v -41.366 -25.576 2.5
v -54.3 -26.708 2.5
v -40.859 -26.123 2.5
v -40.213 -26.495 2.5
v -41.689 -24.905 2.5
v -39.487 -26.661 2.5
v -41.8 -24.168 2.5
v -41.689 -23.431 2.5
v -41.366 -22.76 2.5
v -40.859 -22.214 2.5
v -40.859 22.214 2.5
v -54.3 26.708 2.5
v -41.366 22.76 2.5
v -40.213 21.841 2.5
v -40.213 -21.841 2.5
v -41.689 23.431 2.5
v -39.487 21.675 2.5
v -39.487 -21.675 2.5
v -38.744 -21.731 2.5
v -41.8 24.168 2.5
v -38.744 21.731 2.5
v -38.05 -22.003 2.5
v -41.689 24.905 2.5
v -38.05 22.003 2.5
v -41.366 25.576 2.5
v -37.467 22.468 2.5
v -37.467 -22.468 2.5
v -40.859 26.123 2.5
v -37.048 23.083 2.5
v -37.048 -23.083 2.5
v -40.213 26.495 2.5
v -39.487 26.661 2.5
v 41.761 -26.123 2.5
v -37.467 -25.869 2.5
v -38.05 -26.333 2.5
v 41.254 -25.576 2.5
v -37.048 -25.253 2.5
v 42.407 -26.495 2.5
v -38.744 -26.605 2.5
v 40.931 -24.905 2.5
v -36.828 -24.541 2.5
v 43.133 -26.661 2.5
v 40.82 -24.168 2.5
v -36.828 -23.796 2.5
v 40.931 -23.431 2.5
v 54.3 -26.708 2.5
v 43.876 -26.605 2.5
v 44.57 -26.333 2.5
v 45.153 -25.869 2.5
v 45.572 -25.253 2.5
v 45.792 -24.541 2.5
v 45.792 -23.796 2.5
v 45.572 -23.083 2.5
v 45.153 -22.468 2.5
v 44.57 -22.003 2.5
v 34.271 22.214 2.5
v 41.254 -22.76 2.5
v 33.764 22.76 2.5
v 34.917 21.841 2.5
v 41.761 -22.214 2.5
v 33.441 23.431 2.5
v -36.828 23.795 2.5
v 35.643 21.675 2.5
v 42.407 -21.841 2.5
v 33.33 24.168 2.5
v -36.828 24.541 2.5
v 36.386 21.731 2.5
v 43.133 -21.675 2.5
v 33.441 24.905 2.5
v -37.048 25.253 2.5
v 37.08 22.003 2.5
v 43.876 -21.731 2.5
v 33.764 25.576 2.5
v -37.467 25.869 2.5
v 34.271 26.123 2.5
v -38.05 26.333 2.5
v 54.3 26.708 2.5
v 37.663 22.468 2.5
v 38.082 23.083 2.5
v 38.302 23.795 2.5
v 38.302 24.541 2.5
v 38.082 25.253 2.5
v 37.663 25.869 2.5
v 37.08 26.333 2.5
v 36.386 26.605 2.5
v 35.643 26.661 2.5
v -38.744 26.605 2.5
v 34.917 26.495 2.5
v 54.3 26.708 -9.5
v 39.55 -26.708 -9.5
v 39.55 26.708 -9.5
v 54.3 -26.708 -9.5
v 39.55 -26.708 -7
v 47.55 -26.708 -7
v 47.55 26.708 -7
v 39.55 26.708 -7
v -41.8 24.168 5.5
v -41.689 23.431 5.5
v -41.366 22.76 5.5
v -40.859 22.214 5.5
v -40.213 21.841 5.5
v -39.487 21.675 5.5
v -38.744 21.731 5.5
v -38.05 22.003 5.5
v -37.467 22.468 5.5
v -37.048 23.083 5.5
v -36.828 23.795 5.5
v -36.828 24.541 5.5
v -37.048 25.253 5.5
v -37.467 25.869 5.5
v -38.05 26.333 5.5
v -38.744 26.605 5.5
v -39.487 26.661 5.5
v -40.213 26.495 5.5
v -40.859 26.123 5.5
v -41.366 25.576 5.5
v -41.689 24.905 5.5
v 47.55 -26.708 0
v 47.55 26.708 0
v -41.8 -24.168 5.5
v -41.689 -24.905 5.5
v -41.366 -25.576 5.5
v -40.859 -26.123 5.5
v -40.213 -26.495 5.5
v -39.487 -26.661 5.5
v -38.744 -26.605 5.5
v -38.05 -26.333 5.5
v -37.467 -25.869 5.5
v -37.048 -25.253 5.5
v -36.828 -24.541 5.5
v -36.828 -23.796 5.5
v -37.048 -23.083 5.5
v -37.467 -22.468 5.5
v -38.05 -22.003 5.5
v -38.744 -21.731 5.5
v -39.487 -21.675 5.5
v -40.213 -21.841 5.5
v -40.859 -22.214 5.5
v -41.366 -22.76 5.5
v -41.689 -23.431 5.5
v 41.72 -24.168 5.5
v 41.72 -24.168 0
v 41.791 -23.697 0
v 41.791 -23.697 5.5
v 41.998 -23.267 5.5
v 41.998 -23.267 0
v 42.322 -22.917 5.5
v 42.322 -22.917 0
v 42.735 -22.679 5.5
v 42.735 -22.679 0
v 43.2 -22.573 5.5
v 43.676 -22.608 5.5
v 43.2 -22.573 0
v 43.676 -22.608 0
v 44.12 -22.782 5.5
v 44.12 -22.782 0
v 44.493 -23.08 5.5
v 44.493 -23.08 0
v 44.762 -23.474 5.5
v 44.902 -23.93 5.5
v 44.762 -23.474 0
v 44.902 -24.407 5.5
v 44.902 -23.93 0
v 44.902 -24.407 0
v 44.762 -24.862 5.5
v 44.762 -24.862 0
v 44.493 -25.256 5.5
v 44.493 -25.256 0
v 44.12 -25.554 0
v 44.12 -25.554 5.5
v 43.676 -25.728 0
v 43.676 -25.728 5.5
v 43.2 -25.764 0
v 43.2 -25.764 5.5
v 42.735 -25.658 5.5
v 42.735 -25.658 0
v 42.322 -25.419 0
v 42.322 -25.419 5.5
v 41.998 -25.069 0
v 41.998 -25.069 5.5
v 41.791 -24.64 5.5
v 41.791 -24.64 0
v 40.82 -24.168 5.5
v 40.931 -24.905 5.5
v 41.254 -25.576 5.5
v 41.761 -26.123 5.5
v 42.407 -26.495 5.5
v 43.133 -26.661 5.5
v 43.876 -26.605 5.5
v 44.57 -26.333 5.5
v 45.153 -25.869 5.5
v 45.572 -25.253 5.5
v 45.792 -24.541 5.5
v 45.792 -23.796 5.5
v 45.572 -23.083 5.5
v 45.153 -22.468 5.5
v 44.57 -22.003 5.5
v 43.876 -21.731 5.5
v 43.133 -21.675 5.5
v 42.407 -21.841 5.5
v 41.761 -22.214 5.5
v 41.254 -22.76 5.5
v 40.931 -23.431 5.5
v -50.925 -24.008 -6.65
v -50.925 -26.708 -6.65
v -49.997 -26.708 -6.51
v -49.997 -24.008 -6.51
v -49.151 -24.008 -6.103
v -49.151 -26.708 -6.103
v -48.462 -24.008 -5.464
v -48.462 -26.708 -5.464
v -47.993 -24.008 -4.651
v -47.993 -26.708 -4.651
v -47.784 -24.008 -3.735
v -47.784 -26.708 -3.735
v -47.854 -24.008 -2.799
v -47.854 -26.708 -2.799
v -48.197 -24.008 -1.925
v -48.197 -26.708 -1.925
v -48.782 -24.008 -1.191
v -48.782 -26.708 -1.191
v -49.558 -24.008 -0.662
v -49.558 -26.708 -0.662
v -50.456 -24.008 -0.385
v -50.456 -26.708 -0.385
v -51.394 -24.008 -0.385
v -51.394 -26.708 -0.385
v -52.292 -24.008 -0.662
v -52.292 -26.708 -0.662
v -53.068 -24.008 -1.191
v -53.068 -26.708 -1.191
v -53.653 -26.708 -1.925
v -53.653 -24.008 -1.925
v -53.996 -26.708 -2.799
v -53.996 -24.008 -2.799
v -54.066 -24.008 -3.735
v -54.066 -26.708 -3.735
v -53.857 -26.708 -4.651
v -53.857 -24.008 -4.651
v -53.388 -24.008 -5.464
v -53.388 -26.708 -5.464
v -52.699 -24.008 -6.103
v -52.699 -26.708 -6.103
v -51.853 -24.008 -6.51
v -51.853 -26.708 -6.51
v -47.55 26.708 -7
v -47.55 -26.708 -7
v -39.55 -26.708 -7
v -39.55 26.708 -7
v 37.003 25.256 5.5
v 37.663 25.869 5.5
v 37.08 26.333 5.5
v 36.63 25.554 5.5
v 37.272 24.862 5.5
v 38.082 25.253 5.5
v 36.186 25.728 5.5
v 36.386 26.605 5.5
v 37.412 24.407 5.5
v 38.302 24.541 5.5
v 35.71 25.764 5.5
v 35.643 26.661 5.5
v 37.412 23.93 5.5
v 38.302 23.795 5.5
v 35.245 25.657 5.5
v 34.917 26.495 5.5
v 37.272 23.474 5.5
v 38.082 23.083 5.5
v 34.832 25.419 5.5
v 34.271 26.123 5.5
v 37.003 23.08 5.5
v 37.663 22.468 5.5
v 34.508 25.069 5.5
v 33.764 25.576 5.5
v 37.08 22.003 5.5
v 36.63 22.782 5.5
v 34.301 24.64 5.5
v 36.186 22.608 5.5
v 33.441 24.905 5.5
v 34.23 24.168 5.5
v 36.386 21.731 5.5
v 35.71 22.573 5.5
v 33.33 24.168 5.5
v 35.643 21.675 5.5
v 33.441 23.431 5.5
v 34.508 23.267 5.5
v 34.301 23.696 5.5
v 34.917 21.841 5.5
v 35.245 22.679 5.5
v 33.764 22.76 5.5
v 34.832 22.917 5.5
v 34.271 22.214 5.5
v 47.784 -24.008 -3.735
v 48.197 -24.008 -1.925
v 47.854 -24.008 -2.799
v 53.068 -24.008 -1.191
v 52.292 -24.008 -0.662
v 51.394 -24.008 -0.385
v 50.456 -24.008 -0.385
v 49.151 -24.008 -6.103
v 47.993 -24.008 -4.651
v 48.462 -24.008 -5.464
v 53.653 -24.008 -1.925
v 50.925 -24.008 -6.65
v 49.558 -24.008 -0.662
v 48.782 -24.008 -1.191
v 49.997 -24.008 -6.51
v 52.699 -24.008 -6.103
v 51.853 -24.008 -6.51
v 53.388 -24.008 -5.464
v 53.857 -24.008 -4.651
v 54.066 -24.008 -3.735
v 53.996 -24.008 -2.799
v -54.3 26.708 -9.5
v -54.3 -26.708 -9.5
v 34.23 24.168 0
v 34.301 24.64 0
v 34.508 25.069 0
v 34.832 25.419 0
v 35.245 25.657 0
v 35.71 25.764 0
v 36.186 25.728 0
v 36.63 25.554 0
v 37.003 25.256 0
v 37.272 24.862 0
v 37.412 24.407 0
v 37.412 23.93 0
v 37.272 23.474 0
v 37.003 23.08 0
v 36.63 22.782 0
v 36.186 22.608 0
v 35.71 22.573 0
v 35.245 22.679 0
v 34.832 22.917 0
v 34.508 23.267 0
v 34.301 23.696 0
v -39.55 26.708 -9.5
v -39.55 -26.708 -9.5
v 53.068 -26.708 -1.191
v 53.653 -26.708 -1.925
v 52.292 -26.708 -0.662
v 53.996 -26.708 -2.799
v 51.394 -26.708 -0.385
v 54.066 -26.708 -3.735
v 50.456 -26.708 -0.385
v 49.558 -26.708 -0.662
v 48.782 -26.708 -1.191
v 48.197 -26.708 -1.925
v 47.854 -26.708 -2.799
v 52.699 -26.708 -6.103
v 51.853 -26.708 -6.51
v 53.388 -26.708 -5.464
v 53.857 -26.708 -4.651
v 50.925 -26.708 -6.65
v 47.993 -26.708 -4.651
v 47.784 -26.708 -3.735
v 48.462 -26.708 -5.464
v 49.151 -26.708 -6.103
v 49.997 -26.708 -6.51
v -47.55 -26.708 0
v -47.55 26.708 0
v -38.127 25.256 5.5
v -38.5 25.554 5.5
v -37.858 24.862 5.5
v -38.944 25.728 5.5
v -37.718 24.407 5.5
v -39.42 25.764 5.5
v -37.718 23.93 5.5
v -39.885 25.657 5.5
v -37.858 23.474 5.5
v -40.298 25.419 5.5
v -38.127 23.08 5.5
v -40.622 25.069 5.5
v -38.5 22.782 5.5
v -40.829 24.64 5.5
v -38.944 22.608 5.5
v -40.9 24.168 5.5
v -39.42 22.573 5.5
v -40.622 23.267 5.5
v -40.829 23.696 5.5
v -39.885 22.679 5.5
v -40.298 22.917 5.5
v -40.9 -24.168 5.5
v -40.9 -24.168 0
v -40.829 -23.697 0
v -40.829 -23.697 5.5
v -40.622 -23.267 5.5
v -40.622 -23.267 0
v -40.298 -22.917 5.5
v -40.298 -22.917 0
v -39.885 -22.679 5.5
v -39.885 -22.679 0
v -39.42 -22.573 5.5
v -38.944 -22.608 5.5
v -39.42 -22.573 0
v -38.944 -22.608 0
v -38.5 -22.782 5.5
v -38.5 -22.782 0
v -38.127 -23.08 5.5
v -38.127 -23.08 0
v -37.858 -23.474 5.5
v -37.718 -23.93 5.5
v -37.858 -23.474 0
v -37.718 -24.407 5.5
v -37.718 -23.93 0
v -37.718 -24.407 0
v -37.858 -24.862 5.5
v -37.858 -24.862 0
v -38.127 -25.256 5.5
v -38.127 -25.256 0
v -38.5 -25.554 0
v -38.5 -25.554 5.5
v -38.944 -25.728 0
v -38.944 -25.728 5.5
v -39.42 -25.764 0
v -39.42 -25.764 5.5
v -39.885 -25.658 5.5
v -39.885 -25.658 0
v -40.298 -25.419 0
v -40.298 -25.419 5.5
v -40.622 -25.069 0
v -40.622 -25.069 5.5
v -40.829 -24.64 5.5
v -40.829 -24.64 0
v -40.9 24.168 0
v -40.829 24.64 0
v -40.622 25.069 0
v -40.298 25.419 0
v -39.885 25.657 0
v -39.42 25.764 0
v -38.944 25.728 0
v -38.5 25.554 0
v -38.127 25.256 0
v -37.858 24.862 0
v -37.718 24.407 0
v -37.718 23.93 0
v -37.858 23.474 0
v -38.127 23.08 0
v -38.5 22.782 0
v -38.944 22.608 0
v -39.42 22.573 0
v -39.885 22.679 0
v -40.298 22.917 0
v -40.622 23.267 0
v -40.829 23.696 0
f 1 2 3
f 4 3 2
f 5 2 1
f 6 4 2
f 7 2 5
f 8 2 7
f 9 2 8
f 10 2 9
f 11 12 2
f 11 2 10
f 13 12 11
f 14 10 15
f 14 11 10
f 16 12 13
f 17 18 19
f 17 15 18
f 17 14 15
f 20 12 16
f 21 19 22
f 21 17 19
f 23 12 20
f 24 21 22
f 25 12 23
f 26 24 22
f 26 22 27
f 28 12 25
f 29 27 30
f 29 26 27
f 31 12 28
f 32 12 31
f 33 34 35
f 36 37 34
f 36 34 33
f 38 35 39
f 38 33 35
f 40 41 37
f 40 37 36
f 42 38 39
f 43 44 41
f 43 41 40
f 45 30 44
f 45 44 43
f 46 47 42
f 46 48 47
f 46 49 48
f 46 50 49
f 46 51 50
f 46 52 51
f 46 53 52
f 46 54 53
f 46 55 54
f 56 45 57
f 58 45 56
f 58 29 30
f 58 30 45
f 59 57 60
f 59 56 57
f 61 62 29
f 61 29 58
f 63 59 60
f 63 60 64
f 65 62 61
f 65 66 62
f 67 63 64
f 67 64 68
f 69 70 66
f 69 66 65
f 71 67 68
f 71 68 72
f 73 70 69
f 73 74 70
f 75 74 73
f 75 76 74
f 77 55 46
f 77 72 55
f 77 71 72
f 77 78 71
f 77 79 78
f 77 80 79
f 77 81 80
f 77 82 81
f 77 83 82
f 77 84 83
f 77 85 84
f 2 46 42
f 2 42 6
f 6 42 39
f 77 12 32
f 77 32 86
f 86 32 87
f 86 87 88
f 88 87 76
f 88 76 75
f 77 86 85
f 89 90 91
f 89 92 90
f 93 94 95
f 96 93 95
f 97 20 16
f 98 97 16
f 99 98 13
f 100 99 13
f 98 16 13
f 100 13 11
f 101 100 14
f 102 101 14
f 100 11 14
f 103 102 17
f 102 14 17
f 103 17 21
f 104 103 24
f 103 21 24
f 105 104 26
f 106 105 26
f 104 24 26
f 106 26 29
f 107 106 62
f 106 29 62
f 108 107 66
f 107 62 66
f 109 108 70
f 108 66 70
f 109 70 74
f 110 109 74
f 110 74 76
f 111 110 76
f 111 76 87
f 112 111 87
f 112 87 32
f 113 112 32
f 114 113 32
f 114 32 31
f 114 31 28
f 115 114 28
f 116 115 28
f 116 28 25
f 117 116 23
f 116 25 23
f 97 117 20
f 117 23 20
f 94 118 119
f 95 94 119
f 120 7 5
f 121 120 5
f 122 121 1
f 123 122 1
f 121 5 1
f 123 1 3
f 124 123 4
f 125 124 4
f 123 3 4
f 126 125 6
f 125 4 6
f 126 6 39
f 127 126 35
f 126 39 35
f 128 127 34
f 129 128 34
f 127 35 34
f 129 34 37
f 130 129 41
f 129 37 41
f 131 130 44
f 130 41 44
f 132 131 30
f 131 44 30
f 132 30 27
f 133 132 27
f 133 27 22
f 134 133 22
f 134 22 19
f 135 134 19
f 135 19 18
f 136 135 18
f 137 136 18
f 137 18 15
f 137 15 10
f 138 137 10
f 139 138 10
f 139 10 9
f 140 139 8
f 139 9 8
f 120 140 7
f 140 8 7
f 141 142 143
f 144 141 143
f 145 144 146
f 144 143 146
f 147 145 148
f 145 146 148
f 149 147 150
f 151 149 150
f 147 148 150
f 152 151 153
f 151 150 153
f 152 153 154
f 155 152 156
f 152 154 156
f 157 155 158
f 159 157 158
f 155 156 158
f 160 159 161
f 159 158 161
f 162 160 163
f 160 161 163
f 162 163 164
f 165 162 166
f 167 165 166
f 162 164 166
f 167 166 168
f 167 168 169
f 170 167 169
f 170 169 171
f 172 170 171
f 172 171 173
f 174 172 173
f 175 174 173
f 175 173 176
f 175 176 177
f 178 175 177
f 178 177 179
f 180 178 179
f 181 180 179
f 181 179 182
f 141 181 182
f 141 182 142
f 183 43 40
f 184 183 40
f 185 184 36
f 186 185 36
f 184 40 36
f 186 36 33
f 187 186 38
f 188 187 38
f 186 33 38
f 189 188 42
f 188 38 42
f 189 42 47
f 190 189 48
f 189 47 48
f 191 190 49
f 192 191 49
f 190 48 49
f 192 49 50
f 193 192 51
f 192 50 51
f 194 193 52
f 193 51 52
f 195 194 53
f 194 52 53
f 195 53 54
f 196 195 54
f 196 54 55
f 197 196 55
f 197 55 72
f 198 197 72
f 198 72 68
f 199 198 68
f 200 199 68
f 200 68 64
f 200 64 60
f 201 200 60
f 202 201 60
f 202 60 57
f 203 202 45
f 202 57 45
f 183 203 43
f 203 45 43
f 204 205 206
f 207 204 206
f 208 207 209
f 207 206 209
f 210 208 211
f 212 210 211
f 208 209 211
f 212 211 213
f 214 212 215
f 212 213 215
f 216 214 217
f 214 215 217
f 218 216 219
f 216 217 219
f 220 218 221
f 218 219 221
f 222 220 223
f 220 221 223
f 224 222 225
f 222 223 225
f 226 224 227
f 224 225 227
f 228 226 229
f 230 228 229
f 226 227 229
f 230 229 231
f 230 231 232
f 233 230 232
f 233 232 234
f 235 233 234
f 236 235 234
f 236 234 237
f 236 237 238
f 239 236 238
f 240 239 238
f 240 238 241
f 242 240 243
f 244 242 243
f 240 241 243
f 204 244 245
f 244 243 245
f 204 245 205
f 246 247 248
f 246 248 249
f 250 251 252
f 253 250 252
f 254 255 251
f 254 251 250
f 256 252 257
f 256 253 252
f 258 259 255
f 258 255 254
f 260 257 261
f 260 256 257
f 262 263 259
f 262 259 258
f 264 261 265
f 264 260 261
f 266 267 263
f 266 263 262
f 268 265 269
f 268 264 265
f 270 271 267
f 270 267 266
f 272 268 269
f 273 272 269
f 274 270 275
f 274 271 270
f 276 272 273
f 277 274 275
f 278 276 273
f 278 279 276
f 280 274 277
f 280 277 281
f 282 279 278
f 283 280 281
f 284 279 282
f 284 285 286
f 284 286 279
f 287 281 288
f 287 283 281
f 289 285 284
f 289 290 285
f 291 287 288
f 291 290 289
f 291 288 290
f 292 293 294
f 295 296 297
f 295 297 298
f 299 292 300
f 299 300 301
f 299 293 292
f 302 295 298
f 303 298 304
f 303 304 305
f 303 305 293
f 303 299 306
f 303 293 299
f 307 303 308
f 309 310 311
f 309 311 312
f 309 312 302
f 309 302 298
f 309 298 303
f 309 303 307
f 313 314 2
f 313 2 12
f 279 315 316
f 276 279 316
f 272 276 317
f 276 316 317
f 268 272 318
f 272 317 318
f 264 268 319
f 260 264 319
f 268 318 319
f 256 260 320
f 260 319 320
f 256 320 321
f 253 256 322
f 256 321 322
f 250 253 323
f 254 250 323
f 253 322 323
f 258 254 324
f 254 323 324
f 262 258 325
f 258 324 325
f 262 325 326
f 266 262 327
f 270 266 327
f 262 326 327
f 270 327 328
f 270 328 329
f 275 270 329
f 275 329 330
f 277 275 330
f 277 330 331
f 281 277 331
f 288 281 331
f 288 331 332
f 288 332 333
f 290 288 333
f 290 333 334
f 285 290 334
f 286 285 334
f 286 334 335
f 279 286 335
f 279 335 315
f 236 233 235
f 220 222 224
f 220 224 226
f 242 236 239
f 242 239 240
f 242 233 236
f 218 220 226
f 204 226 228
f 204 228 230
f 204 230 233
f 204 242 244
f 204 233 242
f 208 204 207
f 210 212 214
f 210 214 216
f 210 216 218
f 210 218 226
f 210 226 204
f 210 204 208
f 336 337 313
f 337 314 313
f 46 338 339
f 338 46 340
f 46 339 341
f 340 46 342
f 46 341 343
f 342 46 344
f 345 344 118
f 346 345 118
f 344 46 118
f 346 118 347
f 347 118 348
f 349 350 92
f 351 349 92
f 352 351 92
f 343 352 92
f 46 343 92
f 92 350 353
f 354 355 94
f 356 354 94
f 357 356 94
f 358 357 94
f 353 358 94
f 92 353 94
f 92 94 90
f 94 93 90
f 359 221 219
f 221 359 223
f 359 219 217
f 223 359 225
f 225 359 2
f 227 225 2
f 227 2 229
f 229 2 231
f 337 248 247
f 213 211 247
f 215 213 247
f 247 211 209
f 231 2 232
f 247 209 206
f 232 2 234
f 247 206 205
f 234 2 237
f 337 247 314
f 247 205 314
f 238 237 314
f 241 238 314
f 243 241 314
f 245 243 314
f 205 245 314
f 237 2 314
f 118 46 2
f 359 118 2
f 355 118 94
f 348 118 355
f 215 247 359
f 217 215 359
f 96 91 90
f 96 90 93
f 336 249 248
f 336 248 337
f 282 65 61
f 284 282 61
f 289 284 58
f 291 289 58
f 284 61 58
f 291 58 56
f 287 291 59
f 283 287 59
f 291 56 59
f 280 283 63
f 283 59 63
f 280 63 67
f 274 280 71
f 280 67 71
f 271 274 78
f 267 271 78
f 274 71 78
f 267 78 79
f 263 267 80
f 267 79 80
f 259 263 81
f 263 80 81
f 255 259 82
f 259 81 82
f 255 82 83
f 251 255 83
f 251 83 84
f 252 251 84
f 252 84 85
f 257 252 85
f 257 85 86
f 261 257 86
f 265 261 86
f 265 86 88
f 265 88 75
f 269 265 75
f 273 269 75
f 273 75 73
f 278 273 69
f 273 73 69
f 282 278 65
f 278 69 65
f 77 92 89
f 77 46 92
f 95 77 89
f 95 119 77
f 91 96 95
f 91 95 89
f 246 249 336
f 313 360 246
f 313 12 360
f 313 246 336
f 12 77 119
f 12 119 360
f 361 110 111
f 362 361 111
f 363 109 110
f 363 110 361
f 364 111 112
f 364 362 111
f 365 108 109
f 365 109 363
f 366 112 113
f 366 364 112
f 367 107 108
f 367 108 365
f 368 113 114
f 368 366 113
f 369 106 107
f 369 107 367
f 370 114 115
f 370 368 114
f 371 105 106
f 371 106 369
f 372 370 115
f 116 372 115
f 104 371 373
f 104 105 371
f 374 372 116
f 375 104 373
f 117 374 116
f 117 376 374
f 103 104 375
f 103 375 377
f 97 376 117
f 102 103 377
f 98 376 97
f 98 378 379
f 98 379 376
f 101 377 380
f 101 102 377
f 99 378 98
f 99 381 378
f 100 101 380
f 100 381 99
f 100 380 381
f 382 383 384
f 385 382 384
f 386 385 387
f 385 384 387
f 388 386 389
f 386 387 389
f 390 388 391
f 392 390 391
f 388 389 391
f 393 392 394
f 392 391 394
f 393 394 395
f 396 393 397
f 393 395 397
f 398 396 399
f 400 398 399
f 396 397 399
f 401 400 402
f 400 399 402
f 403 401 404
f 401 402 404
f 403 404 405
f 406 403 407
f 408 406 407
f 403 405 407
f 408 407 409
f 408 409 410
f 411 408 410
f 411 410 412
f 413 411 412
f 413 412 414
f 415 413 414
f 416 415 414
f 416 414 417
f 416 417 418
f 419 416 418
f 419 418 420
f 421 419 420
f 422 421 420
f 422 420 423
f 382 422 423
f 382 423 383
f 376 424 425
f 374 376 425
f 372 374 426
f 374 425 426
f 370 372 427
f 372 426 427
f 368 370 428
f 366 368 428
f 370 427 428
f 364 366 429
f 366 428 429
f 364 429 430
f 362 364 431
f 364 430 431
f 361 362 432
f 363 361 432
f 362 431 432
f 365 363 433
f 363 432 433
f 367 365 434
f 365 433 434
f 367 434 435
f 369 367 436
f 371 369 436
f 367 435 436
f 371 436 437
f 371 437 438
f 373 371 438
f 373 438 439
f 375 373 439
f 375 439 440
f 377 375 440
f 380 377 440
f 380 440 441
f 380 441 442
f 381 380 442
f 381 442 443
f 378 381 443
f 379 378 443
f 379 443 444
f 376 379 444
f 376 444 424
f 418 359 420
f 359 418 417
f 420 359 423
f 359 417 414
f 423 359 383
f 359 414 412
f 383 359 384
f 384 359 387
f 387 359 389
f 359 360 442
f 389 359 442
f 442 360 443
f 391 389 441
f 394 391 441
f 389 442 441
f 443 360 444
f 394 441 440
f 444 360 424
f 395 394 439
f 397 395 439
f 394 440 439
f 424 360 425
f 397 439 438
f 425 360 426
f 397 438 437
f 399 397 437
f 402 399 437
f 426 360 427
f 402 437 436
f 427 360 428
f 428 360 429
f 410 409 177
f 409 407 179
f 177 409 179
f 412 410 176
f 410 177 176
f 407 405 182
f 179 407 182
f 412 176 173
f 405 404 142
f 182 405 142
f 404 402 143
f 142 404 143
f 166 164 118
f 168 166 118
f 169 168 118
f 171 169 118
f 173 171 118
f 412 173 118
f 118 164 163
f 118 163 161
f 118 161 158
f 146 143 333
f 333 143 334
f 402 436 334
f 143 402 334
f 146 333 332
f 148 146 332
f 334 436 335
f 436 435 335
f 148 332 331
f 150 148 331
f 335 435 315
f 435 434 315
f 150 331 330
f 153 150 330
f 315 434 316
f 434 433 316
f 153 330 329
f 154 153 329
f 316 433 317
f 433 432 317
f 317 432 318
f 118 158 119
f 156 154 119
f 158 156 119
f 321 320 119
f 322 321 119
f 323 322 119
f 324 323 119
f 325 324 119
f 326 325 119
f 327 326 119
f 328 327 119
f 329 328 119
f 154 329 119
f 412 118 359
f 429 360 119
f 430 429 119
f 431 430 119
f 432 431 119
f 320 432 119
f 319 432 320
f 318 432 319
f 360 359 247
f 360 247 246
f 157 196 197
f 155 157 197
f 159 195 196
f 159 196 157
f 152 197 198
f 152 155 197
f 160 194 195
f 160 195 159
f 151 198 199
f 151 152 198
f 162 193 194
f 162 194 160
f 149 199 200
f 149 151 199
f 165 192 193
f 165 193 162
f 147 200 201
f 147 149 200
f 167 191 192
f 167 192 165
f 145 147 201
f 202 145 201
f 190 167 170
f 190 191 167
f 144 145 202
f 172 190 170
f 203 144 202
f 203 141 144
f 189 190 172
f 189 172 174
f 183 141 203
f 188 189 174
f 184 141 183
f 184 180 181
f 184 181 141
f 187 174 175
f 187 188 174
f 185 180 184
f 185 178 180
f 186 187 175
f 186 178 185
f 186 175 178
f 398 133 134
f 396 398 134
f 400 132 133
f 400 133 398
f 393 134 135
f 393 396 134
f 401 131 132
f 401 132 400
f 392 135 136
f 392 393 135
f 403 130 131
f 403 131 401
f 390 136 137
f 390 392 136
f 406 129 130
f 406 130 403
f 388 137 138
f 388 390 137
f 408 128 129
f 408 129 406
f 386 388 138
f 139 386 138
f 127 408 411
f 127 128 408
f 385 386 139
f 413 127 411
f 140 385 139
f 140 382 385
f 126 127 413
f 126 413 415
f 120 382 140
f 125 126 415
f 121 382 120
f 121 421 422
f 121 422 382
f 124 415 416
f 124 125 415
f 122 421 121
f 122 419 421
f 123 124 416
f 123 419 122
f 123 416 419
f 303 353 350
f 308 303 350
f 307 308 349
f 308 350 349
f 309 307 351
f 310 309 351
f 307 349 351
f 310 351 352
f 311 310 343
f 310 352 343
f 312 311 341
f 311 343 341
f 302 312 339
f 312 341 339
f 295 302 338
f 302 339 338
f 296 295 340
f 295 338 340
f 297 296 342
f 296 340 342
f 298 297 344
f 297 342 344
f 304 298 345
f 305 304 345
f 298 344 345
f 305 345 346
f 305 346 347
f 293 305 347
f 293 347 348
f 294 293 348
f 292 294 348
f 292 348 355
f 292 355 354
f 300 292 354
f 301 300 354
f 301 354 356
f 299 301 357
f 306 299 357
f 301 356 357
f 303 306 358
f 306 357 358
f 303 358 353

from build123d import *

# Parameters (mm, degrees)
SKETCH1_W            = 108.6
SKETCH1_H            = 53.4162
BOSS_EXTRUDE1_DEPTH  = 2.5
SKETCH2_R            = 2.5
BOSS_EXTRUDE2_DEPTH  = 3
M3_CLEARANCE_HOLE1_D = 3.2
SKETCH5_W            = 6.75
SKETCH5_H            = 53.4162
BOSS_EXTRUDE3_DEPTH  = 9.5
SKETCH6_W            = 2.5
SKETCH6_H            = 53.4162
BOSS_EXTRUDE4_DEPTH  = 8
SKETCH7_W            = 2.5
SKETCH7_H            = 53.4162
BOSS_EXTRUDE5_DEPTH  = 8
SKETCH8_R            = 3.15
CUT_EXTRUDE1_DEPTH   = 2.7


with BuildPart() as part:
    # Sketch1 → Boss-Extrude1 (new body)
    with BuildSketch(Plane.XY):
        Rectangle(SKETCH1_W, SKETCH1_H)
    extrude(amount=BOSS_EXTRUDE1_DEPTH)

    # Sketch2 → Boss-Extrude2 (add)
    with BuildSketch(Plane.XY.offset(2.5)):
        with Locations(Location((-39.3, 24.1681, 0), (0, 0, 180))):
            Circle(SKETCH2_R)
        with Locations(Location((35.83, 24.1681, 0), (0, 0, 180))):
            Circle(SKETCH2_R)
        with Locations(Location((43.32, -24.16810902, 0), (0, 0, 180))):
            Circle(SKETCH2_R)
        with Locations(Location((-39.3, -24.16810902, 0), (0, 0, 180))):
            Circle(SKETCH2_R)
    extrude(amount=BOSS_EXTRUDE2_DEPTH)

    # M3 Clearance Hole1 (through all)
    with Locations(Plane.XY.offset(5.5)):
        with Locations((-39.3, 24.1681), (35.83, 24.1681), (43.32, -24.16810902), (-39.3, -24.16810902)):
            Hole(M3_CLEARANCE_HOLE1_D / 2)

    # Sketch5 → Boss-Extrude3 (add)
    with BuildSketch(Plane(origin=(0, 0, 0), x_dir=(-1, 0, 0), z_dir=(0, 0, -1))):
        with Locations((-50.925, 0)):
            Rectangle(SKETCH5_W, SKETCH5_H)
        with Locations((50.925, 0)):
            Rectangle(SKETCH5_W, SKETCH5_H)
    extrude(amount=BOSS_EXTRUDE3_DEPTH)

    # Sketch6 → Boss-Extrude4 (add)
    with BuildSketch(Plane.ZY.offset(-47.55)):
        with Locations((-8.25, 0)):
            Rectangle(SKETCH6_W, SKETCH6_H)
    extrude(amount=BOSS_EXTRUDE4_DEPTH)

    # Sketch7 → Boss-Extrude5 (add)
    with BuildSketch(Plane(origin=(-47.55, 0, 0), x_dir=(0, 0, -1), z_dir=(1, 0, 0))):
        with Locations((8.25, 0)):
            Rectangle(SKETCH7_W, SKETCH7_H)
    extrude(amount=BOSS_EXTRUDE5_DEPTH)

    # Sketch8 → Cut-Extrude1 (cut)
    with BuildSketch(Plane.XZ.offset(26.7081)):
        with Locations(Location((-50.925, -3.5, 0), (0, 0, 270))):
            Circle(SKETCH8_R)
        with Locations(Location((50.925, -3.5, 0), (0, 0, 270))):
            Circle(SKETCH8_R)
    extrude(amount=-CUT_EXTRUDE1_DEPTH, mode=Mode.SUBTRACT)


solid = part.part
